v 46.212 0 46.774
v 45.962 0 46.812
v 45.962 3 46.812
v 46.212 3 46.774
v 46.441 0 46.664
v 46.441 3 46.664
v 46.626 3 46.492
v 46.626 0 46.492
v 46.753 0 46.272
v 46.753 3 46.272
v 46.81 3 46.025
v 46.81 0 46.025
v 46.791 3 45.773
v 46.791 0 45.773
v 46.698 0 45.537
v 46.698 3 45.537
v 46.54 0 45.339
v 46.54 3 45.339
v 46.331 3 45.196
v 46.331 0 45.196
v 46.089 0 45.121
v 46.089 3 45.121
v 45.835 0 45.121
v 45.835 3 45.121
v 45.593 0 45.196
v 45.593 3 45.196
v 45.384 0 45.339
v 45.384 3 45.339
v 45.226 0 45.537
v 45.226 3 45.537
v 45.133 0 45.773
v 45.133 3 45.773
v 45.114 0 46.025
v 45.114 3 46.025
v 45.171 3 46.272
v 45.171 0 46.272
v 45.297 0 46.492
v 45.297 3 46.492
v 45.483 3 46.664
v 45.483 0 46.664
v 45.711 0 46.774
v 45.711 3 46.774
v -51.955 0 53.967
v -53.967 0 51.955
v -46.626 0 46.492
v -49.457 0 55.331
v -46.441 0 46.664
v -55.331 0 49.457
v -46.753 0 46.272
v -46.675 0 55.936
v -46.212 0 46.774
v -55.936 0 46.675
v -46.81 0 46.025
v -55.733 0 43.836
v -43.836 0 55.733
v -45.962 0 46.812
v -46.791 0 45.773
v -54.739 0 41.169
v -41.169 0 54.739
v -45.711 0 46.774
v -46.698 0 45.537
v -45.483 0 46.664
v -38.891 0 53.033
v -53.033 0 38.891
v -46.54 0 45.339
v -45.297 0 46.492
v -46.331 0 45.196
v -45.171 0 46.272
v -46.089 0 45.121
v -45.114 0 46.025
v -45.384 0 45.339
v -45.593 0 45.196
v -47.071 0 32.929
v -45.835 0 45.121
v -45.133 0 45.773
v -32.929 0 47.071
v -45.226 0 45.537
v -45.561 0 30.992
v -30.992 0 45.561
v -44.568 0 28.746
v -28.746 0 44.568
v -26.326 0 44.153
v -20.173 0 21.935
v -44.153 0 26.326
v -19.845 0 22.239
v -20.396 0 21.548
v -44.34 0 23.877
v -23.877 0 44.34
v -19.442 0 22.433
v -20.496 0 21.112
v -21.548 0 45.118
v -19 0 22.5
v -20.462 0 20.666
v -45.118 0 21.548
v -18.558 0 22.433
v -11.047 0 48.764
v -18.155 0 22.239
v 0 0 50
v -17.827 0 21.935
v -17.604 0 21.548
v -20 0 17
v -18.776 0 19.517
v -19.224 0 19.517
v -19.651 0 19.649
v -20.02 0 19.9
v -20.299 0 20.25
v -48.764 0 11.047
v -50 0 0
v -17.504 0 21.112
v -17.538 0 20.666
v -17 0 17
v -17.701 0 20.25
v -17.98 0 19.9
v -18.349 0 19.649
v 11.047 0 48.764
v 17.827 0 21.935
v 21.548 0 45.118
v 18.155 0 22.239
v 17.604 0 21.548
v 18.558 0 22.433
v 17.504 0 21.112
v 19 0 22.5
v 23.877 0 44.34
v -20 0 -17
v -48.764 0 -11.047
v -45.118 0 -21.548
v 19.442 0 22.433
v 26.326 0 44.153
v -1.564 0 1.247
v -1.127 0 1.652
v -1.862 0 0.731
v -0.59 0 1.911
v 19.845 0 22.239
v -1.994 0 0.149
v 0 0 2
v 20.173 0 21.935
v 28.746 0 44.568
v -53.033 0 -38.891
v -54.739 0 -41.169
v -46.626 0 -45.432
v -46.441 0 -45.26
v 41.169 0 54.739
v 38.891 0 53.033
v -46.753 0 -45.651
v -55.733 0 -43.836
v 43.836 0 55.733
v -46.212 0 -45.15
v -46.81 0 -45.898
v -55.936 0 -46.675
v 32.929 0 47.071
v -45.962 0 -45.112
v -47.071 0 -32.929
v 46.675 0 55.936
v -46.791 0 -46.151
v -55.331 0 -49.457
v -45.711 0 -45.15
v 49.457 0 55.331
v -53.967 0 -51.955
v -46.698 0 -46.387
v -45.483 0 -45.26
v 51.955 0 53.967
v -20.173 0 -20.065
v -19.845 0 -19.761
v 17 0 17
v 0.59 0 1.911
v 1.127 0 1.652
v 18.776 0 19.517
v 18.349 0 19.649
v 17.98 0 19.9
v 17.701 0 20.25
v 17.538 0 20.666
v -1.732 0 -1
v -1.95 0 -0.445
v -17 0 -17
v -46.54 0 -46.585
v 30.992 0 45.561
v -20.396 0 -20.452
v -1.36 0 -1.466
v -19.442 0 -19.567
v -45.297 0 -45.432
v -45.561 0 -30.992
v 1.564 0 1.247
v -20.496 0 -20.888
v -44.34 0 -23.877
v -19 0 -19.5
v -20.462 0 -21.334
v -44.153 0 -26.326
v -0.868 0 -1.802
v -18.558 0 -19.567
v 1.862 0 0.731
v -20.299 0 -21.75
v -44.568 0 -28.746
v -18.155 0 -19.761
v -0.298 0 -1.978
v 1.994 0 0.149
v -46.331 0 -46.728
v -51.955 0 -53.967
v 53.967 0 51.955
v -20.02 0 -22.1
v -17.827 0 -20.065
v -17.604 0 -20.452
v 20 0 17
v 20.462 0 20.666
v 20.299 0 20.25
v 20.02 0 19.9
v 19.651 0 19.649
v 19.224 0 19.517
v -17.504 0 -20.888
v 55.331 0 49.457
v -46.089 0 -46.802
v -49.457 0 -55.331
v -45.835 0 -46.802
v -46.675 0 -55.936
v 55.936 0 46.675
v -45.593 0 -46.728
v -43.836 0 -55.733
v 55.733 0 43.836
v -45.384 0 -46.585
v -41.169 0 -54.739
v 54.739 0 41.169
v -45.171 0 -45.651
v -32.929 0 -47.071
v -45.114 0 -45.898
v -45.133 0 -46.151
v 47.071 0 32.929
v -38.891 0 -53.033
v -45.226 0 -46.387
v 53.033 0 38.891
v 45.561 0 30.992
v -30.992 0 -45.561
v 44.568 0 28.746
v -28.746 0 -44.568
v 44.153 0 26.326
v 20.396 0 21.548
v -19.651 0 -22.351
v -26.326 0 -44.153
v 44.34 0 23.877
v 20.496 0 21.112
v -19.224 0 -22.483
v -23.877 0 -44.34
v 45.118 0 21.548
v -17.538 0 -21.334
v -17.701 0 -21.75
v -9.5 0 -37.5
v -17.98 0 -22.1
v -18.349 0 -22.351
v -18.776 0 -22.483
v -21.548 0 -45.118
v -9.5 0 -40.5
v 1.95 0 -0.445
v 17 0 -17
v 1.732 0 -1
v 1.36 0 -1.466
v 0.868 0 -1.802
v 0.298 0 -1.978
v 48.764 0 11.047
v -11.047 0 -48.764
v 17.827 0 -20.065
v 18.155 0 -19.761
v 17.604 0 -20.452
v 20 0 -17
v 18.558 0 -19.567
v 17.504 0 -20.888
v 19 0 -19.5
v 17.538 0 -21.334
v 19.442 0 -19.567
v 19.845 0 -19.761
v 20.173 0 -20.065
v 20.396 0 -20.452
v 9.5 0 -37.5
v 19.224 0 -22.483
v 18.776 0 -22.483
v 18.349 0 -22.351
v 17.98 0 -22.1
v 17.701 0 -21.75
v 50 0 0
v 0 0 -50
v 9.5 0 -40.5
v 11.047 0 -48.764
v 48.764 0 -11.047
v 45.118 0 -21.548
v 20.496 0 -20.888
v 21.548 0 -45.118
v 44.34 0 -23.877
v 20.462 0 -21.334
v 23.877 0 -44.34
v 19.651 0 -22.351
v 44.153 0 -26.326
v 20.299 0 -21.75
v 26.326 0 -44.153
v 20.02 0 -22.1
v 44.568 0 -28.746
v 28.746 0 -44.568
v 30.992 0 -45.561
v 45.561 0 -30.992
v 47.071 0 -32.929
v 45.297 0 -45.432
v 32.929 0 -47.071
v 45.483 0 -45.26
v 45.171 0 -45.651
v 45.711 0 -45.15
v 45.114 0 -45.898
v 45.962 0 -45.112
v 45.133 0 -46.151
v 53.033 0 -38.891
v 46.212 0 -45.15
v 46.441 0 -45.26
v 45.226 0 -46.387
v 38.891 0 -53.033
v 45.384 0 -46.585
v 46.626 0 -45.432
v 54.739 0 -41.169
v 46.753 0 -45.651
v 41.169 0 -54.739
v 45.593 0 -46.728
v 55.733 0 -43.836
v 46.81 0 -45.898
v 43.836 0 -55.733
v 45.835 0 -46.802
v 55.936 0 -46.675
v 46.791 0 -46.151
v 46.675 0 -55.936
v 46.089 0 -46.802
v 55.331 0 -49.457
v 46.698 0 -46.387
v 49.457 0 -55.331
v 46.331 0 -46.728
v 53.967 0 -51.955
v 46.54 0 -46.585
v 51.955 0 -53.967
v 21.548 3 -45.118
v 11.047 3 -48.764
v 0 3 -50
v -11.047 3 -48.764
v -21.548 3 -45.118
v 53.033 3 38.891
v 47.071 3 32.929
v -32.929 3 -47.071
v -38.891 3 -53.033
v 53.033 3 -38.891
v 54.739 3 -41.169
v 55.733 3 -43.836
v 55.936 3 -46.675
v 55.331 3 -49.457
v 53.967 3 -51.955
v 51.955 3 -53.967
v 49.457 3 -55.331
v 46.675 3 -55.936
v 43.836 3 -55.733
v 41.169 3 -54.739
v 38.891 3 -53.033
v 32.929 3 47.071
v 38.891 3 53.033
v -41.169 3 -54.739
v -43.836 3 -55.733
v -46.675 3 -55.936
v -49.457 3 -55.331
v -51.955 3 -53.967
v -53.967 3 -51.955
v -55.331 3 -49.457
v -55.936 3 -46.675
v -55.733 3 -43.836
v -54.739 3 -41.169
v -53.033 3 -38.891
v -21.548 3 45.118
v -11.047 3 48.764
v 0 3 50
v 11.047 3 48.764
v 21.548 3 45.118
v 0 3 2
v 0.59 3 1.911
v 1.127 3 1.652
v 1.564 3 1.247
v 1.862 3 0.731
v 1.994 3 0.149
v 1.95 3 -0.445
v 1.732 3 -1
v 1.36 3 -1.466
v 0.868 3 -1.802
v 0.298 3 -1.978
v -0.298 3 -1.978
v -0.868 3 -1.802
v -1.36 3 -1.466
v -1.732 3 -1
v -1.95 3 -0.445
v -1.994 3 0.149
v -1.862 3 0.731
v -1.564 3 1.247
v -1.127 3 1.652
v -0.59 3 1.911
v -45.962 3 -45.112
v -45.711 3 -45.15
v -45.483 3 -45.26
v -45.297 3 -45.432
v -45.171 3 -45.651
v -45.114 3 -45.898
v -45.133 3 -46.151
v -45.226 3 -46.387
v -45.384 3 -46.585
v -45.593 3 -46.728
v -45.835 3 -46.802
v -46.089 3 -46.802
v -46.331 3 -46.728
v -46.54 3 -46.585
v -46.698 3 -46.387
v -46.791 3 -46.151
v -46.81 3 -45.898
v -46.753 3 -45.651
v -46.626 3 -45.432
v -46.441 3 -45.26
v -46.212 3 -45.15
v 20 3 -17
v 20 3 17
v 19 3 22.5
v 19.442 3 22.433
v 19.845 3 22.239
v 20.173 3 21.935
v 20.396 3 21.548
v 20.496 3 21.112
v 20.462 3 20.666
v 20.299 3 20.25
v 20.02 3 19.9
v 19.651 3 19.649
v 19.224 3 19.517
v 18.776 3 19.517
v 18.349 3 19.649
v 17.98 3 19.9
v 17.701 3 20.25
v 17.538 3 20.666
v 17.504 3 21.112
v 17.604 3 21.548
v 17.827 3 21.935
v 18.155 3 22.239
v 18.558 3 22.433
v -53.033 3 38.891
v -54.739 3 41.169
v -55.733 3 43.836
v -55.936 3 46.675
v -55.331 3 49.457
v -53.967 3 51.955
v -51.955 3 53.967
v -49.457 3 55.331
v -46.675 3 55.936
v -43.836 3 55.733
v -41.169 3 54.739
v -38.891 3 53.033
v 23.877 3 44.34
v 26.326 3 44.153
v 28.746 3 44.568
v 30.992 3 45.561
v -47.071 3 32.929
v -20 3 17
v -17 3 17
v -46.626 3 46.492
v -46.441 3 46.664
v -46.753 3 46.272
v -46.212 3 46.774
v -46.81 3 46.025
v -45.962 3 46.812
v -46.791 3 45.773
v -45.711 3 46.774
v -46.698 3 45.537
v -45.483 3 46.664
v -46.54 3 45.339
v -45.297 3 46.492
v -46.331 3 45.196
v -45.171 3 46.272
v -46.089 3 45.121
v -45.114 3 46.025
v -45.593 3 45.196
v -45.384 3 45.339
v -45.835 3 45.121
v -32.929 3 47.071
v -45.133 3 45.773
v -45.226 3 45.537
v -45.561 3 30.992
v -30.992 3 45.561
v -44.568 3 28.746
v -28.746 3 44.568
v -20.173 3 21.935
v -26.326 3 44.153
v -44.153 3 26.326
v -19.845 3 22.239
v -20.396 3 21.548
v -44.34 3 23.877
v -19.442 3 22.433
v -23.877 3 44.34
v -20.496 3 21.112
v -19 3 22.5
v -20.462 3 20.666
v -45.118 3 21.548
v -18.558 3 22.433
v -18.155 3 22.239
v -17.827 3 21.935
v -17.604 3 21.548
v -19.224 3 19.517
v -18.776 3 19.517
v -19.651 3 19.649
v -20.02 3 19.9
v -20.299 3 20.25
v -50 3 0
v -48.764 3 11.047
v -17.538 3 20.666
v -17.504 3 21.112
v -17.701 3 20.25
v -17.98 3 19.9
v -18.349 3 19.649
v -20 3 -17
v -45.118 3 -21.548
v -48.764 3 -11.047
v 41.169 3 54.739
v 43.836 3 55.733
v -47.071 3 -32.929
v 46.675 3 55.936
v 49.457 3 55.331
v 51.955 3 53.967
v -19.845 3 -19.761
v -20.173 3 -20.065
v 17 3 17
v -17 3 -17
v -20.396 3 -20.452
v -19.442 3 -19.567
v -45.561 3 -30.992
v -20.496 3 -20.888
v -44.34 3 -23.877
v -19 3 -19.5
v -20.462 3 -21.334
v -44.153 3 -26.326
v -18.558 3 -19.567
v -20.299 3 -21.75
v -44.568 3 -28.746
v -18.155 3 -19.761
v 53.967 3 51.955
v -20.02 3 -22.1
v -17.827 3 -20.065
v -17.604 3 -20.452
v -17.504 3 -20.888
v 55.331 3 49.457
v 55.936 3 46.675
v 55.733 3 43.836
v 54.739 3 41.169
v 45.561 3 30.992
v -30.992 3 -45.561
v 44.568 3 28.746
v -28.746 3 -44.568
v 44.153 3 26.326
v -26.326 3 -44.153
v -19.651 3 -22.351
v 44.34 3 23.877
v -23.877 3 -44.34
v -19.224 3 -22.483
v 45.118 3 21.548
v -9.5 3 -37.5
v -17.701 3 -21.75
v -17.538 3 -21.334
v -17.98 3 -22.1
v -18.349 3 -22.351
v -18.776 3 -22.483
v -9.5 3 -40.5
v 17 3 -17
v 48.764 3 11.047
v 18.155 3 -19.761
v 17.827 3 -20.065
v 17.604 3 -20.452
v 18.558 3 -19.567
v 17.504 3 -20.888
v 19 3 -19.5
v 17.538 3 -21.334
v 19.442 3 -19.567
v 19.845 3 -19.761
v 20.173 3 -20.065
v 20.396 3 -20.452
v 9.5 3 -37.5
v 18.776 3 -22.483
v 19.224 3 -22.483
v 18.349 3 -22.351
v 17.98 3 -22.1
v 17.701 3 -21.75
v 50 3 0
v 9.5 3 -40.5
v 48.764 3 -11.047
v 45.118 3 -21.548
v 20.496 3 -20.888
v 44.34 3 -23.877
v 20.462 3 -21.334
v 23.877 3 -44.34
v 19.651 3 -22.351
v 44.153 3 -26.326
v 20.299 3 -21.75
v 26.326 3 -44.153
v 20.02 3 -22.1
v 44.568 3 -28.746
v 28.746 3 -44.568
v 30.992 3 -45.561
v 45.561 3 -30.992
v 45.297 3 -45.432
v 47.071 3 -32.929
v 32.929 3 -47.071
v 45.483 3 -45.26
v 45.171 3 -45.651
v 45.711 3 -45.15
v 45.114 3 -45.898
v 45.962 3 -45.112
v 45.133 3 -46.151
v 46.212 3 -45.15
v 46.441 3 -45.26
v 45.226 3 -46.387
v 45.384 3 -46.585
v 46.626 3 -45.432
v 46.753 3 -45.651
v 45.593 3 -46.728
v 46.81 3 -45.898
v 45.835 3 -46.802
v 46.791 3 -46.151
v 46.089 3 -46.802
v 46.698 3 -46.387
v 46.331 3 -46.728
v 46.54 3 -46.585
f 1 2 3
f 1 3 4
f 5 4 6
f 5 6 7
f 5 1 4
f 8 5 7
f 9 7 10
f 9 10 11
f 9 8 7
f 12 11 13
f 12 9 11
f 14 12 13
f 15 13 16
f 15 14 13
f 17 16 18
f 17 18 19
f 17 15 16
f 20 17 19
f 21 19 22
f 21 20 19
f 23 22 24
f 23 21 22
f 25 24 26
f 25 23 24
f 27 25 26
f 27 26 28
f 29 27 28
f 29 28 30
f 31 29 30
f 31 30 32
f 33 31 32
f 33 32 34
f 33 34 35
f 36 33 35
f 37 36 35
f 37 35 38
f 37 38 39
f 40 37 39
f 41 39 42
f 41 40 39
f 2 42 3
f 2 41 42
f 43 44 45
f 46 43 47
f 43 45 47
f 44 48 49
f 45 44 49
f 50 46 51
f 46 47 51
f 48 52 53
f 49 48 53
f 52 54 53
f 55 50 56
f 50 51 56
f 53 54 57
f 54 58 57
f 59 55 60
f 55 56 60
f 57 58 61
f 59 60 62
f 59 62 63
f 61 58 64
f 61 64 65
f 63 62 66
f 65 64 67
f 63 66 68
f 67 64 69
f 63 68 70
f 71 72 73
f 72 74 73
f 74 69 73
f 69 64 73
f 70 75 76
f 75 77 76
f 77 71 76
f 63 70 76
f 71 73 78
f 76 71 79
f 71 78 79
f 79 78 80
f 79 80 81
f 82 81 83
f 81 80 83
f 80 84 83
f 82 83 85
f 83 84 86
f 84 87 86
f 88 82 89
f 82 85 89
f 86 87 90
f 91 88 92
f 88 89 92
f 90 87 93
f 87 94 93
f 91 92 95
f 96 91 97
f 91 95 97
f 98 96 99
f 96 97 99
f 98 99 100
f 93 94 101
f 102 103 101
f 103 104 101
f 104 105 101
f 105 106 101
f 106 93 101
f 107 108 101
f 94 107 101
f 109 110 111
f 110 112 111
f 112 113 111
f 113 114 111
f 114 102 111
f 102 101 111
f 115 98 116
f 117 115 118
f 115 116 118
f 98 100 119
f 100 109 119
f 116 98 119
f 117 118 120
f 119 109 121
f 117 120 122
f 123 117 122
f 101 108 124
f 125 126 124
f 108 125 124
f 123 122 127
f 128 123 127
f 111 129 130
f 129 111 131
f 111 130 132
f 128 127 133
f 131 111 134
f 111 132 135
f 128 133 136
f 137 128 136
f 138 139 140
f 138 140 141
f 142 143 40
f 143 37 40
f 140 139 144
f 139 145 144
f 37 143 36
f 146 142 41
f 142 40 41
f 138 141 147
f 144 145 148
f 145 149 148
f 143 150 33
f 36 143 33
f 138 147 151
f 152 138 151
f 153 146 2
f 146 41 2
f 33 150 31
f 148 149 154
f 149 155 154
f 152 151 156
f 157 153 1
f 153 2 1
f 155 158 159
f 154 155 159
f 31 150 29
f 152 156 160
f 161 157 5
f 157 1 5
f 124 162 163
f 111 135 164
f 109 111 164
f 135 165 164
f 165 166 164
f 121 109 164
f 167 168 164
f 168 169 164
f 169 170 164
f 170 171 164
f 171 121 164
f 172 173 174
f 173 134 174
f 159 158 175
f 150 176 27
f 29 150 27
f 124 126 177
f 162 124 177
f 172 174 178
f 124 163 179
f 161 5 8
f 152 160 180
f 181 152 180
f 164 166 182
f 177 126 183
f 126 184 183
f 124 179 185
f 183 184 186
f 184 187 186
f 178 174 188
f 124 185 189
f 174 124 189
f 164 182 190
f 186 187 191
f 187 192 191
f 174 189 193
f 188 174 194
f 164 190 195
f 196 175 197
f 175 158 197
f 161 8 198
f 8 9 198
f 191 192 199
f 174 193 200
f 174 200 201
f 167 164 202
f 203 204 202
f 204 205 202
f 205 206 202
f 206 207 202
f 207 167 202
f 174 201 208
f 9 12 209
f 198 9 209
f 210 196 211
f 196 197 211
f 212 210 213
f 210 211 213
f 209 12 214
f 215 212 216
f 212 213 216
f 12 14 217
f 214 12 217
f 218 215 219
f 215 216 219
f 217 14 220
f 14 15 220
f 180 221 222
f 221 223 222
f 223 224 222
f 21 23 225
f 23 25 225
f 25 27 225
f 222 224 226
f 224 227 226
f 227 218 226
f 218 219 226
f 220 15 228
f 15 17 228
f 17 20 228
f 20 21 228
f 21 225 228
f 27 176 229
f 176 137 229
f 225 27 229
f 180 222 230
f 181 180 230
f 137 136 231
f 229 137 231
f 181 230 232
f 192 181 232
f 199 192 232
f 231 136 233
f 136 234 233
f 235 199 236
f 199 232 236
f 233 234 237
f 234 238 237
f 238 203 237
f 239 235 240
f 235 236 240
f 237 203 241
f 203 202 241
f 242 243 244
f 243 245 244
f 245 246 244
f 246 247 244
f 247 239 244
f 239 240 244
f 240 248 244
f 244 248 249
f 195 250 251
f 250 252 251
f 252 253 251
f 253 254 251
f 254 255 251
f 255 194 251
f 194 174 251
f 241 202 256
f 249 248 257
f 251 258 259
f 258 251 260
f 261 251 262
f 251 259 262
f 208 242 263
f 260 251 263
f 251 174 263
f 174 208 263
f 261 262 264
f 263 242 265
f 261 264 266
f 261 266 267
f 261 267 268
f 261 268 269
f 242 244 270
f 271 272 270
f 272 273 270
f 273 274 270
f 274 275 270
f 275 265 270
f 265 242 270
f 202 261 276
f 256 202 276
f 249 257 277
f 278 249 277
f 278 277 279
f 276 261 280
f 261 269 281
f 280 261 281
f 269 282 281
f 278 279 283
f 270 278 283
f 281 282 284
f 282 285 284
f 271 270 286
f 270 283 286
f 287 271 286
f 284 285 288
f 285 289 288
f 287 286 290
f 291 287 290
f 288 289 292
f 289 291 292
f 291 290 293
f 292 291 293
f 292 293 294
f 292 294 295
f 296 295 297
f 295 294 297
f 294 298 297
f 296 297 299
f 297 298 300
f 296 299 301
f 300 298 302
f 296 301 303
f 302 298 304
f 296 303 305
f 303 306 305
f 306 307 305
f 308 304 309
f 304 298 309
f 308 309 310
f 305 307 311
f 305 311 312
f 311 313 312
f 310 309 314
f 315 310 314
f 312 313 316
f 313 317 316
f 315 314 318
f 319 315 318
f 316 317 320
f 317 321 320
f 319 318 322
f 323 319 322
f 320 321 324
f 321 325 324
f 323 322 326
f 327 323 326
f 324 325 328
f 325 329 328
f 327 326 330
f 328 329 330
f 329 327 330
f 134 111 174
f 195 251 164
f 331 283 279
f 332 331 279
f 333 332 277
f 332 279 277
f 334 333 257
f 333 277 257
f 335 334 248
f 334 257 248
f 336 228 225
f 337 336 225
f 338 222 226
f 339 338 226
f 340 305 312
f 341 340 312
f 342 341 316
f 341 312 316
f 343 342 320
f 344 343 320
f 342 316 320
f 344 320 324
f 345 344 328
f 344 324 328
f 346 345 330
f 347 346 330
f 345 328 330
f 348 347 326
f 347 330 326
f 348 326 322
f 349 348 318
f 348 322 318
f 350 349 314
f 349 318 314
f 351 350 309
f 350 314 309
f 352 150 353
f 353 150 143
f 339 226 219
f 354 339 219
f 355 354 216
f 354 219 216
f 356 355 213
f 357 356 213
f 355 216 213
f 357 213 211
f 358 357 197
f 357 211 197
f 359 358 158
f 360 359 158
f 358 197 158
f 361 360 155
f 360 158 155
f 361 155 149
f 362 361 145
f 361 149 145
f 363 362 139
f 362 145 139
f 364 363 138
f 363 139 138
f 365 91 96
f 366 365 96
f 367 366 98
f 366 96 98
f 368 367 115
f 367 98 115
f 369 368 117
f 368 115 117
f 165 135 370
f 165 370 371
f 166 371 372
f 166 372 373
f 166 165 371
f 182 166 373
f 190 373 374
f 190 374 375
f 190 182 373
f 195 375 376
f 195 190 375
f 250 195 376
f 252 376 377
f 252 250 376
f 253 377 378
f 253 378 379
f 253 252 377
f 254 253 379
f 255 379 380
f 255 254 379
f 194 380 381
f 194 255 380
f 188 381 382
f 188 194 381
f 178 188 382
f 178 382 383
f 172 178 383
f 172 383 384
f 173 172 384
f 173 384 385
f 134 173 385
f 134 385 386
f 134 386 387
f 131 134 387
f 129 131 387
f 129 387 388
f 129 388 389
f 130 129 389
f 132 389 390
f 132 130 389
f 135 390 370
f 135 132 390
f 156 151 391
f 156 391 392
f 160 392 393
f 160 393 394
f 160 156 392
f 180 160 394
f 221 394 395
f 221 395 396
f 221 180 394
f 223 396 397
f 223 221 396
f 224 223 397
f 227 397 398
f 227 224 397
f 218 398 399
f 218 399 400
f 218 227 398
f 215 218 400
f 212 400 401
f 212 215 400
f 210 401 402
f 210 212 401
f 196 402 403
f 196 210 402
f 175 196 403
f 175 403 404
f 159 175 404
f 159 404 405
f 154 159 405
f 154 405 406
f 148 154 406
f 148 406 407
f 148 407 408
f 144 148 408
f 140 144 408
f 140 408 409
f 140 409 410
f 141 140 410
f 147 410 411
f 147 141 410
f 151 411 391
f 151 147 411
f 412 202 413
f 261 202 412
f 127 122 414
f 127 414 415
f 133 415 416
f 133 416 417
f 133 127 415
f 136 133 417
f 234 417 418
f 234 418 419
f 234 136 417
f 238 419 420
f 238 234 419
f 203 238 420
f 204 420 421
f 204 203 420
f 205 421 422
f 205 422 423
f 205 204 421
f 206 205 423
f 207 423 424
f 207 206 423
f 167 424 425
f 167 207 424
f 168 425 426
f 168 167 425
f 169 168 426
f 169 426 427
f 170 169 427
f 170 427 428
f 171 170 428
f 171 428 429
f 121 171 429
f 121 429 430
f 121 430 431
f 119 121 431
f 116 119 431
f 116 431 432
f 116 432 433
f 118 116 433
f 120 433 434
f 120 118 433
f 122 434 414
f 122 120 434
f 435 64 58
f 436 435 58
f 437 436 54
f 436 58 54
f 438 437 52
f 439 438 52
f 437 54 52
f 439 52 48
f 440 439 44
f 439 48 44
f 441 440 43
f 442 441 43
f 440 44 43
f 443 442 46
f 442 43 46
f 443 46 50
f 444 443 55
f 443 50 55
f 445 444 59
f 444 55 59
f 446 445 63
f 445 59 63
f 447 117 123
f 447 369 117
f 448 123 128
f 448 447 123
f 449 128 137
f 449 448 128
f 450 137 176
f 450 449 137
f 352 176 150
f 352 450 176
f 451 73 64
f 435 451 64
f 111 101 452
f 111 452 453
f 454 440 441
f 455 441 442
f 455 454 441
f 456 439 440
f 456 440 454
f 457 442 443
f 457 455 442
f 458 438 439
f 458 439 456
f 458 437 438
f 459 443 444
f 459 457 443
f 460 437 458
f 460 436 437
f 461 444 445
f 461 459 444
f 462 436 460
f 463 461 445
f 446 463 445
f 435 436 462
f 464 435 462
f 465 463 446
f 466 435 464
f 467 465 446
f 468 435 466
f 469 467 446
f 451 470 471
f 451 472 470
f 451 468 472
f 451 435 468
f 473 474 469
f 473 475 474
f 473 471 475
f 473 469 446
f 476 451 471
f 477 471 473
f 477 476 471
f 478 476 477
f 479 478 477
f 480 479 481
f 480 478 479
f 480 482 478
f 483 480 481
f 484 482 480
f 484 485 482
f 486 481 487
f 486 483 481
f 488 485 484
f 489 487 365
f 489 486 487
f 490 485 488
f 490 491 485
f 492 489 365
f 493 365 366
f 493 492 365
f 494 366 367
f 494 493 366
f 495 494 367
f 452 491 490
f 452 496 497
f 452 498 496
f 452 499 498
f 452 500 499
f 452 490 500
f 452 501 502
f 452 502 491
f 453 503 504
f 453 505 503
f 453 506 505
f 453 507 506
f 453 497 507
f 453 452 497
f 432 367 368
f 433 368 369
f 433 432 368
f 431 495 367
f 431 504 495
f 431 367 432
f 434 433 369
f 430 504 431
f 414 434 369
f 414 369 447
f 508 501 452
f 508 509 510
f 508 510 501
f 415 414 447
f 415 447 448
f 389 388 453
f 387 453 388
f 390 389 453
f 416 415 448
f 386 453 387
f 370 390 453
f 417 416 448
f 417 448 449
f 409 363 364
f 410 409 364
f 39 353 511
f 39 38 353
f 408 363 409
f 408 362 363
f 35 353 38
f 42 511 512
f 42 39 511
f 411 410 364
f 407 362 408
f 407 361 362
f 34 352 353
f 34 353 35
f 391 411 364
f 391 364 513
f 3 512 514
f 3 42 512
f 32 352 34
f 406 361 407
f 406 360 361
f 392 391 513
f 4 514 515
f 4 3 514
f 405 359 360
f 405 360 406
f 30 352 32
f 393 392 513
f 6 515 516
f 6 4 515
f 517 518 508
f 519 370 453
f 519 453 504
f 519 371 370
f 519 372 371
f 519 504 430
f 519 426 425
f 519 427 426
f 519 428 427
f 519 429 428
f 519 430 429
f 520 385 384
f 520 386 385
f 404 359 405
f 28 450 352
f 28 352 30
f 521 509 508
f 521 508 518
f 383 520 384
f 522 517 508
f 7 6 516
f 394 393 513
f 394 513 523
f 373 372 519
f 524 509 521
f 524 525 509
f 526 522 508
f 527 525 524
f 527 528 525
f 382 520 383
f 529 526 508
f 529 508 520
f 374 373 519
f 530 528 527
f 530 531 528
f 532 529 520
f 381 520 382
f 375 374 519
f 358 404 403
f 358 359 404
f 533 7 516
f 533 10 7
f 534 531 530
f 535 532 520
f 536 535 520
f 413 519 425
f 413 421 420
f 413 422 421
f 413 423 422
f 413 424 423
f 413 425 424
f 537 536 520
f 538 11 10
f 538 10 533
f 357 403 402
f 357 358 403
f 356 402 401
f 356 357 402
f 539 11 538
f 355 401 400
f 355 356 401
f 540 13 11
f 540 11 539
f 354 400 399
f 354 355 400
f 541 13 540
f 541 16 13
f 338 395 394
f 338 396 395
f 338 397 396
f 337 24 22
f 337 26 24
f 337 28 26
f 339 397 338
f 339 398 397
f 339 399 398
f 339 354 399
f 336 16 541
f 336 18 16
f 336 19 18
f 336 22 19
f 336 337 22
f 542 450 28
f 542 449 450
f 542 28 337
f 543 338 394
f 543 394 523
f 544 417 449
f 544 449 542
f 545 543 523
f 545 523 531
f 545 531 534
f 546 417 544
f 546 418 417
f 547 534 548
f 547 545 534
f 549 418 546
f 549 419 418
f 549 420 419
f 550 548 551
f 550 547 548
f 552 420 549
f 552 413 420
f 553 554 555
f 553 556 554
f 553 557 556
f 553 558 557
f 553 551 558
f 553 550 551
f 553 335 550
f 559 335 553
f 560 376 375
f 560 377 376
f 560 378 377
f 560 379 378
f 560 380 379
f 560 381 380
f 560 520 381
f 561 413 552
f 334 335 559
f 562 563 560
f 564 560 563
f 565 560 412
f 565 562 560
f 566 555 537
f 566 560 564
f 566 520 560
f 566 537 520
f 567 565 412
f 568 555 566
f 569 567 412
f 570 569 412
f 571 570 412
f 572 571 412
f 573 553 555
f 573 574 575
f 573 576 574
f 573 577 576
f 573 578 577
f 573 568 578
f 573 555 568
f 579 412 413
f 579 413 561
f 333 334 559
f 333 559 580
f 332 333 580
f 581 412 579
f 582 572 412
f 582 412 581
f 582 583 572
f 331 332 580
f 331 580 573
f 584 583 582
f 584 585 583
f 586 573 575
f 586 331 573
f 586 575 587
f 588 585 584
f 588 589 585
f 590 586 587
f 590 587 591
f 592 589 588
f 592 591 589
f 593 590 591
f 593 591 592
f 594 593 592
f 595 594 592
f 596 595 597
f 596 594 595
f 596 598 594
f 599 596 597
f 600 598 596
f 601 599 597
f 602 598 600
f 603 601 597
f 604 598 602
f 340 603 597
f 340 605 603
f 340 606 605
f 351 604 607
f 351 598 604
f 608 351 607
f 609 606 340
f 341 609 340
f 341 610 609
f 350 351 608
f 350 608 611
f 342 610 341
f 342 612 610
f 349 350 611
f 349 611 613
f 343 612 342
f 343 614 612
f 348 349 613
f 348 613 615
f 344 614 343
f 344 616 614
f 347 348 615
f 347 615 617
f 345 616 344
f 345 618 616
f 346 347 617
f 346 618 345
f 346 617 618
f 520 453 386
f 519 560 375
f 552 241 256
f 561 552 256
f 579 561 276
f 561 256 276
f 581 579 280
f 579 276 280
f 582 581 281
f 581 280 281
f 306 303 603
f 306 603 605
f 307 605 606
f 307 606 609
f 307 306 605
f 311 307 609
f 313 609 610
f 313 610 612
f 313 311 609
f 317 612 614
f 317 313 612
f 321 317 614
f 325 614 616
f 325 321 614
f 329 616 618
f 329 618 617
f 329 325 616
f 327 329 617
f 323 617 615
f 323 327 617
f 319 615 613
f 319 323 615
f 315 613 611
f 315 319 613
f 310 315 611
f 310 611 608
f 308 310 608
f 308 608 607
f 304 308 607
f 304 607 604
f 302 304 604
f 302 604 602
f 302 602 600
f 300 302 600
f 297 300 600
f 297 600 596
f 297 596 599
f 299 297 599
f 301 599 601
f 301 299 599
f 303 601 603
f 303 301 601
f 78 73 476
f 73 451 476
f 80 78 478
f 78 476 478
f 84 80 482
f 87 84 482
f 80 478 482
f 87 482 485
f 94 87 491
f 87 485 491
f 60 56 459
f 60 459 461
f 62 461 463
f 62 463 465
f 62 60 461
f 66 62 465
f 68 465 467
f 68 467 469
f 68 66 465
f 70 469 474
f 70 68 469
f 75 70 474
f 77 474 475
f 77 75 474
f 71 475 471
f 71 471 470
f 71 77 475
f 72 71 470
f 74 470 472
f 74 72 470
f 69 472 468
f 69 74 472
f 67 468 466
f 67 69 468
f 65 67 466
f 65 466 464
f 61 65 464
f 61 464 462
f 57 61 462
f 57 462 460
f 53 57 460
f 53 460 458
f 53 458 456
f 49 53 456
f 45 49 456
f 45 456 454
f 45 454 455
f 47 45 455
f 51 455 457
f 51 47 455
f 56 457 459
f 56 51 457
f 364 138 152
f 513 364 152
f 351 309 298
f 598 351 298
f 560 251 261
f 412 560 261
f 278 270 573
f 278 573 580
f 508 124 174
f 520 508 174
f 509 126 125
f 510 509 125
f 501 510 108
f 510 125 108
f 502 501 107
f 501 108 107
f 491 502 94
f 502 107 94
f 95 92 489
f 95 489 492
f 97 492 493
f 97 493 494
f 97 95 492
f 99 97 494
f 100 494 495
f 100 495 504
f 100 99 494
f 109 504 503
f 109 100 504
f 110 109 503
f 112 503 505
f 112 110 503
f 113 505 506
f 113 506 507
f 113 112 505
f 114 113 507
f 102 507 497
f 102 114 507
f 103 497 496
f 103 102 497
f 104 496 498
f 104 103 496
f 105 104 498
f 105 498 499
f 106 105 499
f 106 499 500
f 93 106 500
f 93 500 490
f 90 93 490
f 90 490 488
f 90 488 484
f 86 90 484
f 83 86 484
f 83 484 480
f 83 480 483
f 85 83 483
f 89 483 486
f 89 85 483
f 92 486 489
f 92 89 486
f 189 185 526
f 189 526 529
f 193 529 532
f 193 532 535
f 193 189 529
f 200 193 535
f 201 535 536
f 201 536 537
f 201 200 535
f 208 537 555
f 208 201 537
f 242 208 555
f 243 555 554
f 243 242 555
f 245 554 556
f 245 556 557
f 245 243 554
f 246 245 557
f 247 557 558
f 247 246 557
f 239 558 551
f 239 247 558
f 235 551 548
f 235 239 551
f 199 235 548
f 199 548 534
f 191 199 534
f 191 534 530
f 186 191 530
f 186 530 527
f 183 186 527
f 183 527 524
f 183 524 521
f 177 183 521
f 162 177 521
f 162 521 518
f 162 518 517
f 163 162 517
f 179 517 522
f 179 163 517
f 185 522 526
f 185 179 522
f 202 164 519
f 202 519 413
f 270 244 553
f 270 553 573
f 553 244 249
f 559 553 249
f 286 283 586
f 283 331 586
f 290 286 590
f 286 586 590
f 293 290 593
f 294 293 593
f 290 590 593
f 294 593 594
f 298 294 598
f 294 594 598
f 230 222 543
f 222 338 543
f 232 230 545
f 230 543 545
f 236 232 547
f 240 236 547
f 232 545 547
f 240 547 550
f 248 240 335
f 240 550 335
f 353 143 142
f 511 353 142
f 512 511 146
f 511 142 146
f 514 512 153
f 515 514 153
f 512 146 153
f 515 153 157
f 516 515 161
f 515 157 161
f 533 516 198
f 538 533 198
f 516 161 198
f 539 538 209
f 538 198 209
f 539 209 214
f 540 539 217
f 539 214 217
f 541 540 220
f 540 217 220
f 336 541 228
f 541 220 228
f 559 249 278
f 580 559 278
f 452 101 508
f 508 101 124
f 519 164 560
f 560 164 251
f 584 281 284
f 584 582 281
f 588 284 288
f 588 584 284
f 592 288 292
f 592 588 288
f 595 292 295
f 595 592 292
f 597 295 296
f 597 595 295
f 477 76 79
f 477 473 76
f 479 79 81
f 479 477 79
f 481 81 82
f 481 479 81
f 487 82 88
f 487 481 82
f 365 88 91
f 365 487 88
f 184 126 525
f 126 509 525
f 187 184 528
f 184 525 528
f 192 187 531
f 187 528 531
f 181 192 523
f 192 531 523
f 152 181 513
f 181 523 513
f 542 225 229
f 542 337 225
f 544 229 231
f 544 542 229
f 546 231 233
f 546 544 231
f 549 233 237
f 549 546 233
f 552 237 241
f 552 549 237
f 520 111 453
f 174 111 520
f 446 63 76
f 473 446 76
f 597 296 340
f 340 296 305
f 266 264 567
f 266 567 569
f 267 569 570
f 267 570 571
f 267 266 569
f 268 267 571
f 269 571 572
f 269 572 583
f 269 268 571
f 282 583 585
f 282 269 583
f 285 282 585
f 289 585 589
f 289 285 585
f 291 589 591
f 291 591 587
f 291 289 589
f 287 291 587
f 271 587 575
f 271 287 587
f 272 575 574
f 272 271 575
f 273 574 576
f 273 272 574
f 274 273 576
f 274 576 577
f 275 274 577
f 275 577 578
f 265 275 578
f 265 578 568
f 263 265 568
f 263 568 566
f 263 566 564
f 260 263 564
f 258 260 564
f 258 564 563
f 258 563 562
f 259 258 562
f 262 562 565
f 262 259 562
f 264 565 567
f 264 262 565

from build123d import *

# Parameters (mm, degrees)
ESQUISSE1_R        = 0.85
ESQUISSE1_R_2      = 1.5
ESQUISSE1_R_3      = 2
ESQUISSE1_W        = 3
ESQUISSE1_H        = 34
ESQUISSE1_W_2      = 19
ESQUISSE1_H_2      = 3
BOSS_EXTRU_1_DEPTH = 3
CONG_1_R           = 10


with BuildPart() as part:
    # Esquisse1 → Boss.-Extru.1 (new body)
    with BuildSketch(Plane(origin=(0, 0, 0), x_dir=(1, 0, 0), z_dir=(0, 1, 0))):
        with BuildLine():
            Line((-38.890872965, -53.033008589), (-27.56994834, -41.712083963))
            ThreePointArc((-27.56994834, -41.712083963), (0, -50), (27.56994834, -41.712083963))
            Line((27.56994834, -41.712083963), (38.890872965, -53.033008589))
            ThreePointArc((38.890872965, -53.033008589), (53.033008589, -53.033008589), (53.033008589, -38.890872965))
            Line((53.033008589, -38.890872965), (41.712083963, -27.56994834))
            ThreePointArc((41.712083963, -27.56994834), (50, 0), (41.712083963, 27.56994834))
            Line((41.712083963, 27.56994834), (53.033008589, 38.890872965))
            ThreePointArc((53.033008589, 38.890872965), (53.033008589, 53.033008589), (38.890872965, 53.033008589))
            Line((38.890872965, 53.033008589), (27.56994834, 41.712083963))
            ThreePointArc((27.56994834, 41.712083963), (0, 50), (-27.56994834, 41.712083963))
            Line((-27.56994834, 41.712083963), (-38.890872965, 53.033008589))
            ThreePointArc((-38.890872965, 53.033008589), (-53.033008589, 53.033008589), (-53.033008589, 38.890872965))
            Line((-53.033008589, 38.890872965), (-41.712083963, 27.56994834))
            ThreePointArc((-41.712083963, 27.56994834), (-50, 0), (-41.712083963, -27.56994834))
            Line((-41.712083963, -27.56994834), (-53.033008589, -38.890872965))
            ThreePointArc((-53.033008589, -38.890872965), (-53.033008589, -53.033008589), (-38.890872965, -53.033008589))
        make_face()
        with Locations(Location((-45.961940777, -45.961940777, 0), (0, 0, 270))):
            Circle(ESQUISSE1_R, mode=Mode.SUBTRACT)
        with Locations(Location((-45.961940777, 45.961940777, 0), (0, 0, 270))):
            Circle(ESQUISSE1_R, mode=Mode.SUBTRACT)
        with Locations(Location((45.961940777, 45.961940777, 0), (0, 0, 270))):
            Circle(ESQUISSE1_R, mode=Mode.SUBTRACT)
        with Locations(Location((45.961940777, -45.961940777, 0), (0, 0, 270))):
            Circle(ESQUISSE1_R, mode=Mode.SUBTRACT)
        with Locations(Location((-19, 21, 0), (0, 0, 270))):
            Circle(ESQUISSE1_R_2, mode=Mode.SUBTRACT)
        with Locations(Location((19, 21, 0), (0, 0, 270))):
            Circle(ESQUISSE1_R_2, mode=Mode.SUBTRACT)
        with Locations(Location((19, -21, 0), (0, 0, 270))):
            Circle(ESQUISSE1_R_2, mode=Mode.SUBTRACT)
        with Locations(Location((-19, -21, 0), (0, 0, 270))):
            Circle(ESQUISSE1_R_2, mode=Mode.SUBTRACT)
        with Locations(Location((0, 0, 0), (0, 0, 270))):
            Circle(ESQUISSE1_R_3, mode=Mode.SUBTRACT)
        with Locations((-18.5, 0)):
            Rectangle(ESQUISSE1_W, ESQUISSE1_H, mode=Mode.SUBTRACT)
        with Locations((18.5, 0)):
            Rectangle(ESQUISSE1_W, ESQUISSE1_H, mode=Mode.SUBTRACT)
        with Locations((0, 39)):
            Rectangle(ESQUISSE1_W_2, ESQUISSE1_H_2, mode=Mode.SUBTRACT)
    extrude(amount=BOSS_EXTRU_1_DEPTH)

    # Congé1
    cong_1_edges = [part.edges().sort_by_distance(p)[0] for p in [
        (-27.56994834, 1.5, 41.712083963),
        (-41.712083963, 1.5, 27.56994834),
        (-41.712083963, 1.5, -27.56994834),
        (-27.56994834, 1.5, -41.712083963),
        (27.56994834, 1.5, -41.712083963),
        (41.712083963, 1.5, -27.56994834),
        (41.712083963, 1.5, 27.56994834),
        (27.56994834, 1.5, 41.712083963),
    ]]
    fillet(cong_1_edges, radius=CONG_1_R)


solid = part.part
